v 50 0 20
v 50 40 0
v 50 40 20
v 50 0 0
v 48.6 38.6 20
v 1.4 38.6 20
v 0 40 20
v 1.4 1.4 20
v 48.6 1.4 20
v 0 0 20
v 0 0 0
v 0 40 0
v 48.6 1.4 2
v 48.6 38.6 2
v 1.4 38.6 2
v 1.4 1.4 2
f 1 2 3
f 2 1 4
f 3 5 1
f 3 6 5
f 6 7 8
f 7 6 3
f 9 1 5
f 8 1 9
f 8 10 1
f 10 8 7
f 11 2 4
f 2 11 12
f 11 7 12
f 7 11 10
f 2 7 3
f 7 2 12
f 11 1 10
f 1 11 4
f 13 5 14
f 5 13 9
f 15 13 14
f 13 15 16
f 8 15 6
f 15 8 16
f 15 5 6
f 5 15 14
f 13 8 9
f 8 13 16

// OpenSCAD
$fn = 32;

// ----------------------------------------------------------------------
// Open box: 1.4 mm walls
// ----------------------------------------------------------------------

// --- parameters (mm) ---
box_l = 50;               // outer length, X
box_w = 40;               // outer width, Y
box_h = 20;               // outer height, Z
wall = 1.4;               // wall thickness
floor = 2;                // floor thickness

difference() {
  cube([box_l, box_w, box_h]);
  translate([wall, wall, floor])
    cube([box_l - 2 * wall, box_w - 2 * wall, box_h]);
}
